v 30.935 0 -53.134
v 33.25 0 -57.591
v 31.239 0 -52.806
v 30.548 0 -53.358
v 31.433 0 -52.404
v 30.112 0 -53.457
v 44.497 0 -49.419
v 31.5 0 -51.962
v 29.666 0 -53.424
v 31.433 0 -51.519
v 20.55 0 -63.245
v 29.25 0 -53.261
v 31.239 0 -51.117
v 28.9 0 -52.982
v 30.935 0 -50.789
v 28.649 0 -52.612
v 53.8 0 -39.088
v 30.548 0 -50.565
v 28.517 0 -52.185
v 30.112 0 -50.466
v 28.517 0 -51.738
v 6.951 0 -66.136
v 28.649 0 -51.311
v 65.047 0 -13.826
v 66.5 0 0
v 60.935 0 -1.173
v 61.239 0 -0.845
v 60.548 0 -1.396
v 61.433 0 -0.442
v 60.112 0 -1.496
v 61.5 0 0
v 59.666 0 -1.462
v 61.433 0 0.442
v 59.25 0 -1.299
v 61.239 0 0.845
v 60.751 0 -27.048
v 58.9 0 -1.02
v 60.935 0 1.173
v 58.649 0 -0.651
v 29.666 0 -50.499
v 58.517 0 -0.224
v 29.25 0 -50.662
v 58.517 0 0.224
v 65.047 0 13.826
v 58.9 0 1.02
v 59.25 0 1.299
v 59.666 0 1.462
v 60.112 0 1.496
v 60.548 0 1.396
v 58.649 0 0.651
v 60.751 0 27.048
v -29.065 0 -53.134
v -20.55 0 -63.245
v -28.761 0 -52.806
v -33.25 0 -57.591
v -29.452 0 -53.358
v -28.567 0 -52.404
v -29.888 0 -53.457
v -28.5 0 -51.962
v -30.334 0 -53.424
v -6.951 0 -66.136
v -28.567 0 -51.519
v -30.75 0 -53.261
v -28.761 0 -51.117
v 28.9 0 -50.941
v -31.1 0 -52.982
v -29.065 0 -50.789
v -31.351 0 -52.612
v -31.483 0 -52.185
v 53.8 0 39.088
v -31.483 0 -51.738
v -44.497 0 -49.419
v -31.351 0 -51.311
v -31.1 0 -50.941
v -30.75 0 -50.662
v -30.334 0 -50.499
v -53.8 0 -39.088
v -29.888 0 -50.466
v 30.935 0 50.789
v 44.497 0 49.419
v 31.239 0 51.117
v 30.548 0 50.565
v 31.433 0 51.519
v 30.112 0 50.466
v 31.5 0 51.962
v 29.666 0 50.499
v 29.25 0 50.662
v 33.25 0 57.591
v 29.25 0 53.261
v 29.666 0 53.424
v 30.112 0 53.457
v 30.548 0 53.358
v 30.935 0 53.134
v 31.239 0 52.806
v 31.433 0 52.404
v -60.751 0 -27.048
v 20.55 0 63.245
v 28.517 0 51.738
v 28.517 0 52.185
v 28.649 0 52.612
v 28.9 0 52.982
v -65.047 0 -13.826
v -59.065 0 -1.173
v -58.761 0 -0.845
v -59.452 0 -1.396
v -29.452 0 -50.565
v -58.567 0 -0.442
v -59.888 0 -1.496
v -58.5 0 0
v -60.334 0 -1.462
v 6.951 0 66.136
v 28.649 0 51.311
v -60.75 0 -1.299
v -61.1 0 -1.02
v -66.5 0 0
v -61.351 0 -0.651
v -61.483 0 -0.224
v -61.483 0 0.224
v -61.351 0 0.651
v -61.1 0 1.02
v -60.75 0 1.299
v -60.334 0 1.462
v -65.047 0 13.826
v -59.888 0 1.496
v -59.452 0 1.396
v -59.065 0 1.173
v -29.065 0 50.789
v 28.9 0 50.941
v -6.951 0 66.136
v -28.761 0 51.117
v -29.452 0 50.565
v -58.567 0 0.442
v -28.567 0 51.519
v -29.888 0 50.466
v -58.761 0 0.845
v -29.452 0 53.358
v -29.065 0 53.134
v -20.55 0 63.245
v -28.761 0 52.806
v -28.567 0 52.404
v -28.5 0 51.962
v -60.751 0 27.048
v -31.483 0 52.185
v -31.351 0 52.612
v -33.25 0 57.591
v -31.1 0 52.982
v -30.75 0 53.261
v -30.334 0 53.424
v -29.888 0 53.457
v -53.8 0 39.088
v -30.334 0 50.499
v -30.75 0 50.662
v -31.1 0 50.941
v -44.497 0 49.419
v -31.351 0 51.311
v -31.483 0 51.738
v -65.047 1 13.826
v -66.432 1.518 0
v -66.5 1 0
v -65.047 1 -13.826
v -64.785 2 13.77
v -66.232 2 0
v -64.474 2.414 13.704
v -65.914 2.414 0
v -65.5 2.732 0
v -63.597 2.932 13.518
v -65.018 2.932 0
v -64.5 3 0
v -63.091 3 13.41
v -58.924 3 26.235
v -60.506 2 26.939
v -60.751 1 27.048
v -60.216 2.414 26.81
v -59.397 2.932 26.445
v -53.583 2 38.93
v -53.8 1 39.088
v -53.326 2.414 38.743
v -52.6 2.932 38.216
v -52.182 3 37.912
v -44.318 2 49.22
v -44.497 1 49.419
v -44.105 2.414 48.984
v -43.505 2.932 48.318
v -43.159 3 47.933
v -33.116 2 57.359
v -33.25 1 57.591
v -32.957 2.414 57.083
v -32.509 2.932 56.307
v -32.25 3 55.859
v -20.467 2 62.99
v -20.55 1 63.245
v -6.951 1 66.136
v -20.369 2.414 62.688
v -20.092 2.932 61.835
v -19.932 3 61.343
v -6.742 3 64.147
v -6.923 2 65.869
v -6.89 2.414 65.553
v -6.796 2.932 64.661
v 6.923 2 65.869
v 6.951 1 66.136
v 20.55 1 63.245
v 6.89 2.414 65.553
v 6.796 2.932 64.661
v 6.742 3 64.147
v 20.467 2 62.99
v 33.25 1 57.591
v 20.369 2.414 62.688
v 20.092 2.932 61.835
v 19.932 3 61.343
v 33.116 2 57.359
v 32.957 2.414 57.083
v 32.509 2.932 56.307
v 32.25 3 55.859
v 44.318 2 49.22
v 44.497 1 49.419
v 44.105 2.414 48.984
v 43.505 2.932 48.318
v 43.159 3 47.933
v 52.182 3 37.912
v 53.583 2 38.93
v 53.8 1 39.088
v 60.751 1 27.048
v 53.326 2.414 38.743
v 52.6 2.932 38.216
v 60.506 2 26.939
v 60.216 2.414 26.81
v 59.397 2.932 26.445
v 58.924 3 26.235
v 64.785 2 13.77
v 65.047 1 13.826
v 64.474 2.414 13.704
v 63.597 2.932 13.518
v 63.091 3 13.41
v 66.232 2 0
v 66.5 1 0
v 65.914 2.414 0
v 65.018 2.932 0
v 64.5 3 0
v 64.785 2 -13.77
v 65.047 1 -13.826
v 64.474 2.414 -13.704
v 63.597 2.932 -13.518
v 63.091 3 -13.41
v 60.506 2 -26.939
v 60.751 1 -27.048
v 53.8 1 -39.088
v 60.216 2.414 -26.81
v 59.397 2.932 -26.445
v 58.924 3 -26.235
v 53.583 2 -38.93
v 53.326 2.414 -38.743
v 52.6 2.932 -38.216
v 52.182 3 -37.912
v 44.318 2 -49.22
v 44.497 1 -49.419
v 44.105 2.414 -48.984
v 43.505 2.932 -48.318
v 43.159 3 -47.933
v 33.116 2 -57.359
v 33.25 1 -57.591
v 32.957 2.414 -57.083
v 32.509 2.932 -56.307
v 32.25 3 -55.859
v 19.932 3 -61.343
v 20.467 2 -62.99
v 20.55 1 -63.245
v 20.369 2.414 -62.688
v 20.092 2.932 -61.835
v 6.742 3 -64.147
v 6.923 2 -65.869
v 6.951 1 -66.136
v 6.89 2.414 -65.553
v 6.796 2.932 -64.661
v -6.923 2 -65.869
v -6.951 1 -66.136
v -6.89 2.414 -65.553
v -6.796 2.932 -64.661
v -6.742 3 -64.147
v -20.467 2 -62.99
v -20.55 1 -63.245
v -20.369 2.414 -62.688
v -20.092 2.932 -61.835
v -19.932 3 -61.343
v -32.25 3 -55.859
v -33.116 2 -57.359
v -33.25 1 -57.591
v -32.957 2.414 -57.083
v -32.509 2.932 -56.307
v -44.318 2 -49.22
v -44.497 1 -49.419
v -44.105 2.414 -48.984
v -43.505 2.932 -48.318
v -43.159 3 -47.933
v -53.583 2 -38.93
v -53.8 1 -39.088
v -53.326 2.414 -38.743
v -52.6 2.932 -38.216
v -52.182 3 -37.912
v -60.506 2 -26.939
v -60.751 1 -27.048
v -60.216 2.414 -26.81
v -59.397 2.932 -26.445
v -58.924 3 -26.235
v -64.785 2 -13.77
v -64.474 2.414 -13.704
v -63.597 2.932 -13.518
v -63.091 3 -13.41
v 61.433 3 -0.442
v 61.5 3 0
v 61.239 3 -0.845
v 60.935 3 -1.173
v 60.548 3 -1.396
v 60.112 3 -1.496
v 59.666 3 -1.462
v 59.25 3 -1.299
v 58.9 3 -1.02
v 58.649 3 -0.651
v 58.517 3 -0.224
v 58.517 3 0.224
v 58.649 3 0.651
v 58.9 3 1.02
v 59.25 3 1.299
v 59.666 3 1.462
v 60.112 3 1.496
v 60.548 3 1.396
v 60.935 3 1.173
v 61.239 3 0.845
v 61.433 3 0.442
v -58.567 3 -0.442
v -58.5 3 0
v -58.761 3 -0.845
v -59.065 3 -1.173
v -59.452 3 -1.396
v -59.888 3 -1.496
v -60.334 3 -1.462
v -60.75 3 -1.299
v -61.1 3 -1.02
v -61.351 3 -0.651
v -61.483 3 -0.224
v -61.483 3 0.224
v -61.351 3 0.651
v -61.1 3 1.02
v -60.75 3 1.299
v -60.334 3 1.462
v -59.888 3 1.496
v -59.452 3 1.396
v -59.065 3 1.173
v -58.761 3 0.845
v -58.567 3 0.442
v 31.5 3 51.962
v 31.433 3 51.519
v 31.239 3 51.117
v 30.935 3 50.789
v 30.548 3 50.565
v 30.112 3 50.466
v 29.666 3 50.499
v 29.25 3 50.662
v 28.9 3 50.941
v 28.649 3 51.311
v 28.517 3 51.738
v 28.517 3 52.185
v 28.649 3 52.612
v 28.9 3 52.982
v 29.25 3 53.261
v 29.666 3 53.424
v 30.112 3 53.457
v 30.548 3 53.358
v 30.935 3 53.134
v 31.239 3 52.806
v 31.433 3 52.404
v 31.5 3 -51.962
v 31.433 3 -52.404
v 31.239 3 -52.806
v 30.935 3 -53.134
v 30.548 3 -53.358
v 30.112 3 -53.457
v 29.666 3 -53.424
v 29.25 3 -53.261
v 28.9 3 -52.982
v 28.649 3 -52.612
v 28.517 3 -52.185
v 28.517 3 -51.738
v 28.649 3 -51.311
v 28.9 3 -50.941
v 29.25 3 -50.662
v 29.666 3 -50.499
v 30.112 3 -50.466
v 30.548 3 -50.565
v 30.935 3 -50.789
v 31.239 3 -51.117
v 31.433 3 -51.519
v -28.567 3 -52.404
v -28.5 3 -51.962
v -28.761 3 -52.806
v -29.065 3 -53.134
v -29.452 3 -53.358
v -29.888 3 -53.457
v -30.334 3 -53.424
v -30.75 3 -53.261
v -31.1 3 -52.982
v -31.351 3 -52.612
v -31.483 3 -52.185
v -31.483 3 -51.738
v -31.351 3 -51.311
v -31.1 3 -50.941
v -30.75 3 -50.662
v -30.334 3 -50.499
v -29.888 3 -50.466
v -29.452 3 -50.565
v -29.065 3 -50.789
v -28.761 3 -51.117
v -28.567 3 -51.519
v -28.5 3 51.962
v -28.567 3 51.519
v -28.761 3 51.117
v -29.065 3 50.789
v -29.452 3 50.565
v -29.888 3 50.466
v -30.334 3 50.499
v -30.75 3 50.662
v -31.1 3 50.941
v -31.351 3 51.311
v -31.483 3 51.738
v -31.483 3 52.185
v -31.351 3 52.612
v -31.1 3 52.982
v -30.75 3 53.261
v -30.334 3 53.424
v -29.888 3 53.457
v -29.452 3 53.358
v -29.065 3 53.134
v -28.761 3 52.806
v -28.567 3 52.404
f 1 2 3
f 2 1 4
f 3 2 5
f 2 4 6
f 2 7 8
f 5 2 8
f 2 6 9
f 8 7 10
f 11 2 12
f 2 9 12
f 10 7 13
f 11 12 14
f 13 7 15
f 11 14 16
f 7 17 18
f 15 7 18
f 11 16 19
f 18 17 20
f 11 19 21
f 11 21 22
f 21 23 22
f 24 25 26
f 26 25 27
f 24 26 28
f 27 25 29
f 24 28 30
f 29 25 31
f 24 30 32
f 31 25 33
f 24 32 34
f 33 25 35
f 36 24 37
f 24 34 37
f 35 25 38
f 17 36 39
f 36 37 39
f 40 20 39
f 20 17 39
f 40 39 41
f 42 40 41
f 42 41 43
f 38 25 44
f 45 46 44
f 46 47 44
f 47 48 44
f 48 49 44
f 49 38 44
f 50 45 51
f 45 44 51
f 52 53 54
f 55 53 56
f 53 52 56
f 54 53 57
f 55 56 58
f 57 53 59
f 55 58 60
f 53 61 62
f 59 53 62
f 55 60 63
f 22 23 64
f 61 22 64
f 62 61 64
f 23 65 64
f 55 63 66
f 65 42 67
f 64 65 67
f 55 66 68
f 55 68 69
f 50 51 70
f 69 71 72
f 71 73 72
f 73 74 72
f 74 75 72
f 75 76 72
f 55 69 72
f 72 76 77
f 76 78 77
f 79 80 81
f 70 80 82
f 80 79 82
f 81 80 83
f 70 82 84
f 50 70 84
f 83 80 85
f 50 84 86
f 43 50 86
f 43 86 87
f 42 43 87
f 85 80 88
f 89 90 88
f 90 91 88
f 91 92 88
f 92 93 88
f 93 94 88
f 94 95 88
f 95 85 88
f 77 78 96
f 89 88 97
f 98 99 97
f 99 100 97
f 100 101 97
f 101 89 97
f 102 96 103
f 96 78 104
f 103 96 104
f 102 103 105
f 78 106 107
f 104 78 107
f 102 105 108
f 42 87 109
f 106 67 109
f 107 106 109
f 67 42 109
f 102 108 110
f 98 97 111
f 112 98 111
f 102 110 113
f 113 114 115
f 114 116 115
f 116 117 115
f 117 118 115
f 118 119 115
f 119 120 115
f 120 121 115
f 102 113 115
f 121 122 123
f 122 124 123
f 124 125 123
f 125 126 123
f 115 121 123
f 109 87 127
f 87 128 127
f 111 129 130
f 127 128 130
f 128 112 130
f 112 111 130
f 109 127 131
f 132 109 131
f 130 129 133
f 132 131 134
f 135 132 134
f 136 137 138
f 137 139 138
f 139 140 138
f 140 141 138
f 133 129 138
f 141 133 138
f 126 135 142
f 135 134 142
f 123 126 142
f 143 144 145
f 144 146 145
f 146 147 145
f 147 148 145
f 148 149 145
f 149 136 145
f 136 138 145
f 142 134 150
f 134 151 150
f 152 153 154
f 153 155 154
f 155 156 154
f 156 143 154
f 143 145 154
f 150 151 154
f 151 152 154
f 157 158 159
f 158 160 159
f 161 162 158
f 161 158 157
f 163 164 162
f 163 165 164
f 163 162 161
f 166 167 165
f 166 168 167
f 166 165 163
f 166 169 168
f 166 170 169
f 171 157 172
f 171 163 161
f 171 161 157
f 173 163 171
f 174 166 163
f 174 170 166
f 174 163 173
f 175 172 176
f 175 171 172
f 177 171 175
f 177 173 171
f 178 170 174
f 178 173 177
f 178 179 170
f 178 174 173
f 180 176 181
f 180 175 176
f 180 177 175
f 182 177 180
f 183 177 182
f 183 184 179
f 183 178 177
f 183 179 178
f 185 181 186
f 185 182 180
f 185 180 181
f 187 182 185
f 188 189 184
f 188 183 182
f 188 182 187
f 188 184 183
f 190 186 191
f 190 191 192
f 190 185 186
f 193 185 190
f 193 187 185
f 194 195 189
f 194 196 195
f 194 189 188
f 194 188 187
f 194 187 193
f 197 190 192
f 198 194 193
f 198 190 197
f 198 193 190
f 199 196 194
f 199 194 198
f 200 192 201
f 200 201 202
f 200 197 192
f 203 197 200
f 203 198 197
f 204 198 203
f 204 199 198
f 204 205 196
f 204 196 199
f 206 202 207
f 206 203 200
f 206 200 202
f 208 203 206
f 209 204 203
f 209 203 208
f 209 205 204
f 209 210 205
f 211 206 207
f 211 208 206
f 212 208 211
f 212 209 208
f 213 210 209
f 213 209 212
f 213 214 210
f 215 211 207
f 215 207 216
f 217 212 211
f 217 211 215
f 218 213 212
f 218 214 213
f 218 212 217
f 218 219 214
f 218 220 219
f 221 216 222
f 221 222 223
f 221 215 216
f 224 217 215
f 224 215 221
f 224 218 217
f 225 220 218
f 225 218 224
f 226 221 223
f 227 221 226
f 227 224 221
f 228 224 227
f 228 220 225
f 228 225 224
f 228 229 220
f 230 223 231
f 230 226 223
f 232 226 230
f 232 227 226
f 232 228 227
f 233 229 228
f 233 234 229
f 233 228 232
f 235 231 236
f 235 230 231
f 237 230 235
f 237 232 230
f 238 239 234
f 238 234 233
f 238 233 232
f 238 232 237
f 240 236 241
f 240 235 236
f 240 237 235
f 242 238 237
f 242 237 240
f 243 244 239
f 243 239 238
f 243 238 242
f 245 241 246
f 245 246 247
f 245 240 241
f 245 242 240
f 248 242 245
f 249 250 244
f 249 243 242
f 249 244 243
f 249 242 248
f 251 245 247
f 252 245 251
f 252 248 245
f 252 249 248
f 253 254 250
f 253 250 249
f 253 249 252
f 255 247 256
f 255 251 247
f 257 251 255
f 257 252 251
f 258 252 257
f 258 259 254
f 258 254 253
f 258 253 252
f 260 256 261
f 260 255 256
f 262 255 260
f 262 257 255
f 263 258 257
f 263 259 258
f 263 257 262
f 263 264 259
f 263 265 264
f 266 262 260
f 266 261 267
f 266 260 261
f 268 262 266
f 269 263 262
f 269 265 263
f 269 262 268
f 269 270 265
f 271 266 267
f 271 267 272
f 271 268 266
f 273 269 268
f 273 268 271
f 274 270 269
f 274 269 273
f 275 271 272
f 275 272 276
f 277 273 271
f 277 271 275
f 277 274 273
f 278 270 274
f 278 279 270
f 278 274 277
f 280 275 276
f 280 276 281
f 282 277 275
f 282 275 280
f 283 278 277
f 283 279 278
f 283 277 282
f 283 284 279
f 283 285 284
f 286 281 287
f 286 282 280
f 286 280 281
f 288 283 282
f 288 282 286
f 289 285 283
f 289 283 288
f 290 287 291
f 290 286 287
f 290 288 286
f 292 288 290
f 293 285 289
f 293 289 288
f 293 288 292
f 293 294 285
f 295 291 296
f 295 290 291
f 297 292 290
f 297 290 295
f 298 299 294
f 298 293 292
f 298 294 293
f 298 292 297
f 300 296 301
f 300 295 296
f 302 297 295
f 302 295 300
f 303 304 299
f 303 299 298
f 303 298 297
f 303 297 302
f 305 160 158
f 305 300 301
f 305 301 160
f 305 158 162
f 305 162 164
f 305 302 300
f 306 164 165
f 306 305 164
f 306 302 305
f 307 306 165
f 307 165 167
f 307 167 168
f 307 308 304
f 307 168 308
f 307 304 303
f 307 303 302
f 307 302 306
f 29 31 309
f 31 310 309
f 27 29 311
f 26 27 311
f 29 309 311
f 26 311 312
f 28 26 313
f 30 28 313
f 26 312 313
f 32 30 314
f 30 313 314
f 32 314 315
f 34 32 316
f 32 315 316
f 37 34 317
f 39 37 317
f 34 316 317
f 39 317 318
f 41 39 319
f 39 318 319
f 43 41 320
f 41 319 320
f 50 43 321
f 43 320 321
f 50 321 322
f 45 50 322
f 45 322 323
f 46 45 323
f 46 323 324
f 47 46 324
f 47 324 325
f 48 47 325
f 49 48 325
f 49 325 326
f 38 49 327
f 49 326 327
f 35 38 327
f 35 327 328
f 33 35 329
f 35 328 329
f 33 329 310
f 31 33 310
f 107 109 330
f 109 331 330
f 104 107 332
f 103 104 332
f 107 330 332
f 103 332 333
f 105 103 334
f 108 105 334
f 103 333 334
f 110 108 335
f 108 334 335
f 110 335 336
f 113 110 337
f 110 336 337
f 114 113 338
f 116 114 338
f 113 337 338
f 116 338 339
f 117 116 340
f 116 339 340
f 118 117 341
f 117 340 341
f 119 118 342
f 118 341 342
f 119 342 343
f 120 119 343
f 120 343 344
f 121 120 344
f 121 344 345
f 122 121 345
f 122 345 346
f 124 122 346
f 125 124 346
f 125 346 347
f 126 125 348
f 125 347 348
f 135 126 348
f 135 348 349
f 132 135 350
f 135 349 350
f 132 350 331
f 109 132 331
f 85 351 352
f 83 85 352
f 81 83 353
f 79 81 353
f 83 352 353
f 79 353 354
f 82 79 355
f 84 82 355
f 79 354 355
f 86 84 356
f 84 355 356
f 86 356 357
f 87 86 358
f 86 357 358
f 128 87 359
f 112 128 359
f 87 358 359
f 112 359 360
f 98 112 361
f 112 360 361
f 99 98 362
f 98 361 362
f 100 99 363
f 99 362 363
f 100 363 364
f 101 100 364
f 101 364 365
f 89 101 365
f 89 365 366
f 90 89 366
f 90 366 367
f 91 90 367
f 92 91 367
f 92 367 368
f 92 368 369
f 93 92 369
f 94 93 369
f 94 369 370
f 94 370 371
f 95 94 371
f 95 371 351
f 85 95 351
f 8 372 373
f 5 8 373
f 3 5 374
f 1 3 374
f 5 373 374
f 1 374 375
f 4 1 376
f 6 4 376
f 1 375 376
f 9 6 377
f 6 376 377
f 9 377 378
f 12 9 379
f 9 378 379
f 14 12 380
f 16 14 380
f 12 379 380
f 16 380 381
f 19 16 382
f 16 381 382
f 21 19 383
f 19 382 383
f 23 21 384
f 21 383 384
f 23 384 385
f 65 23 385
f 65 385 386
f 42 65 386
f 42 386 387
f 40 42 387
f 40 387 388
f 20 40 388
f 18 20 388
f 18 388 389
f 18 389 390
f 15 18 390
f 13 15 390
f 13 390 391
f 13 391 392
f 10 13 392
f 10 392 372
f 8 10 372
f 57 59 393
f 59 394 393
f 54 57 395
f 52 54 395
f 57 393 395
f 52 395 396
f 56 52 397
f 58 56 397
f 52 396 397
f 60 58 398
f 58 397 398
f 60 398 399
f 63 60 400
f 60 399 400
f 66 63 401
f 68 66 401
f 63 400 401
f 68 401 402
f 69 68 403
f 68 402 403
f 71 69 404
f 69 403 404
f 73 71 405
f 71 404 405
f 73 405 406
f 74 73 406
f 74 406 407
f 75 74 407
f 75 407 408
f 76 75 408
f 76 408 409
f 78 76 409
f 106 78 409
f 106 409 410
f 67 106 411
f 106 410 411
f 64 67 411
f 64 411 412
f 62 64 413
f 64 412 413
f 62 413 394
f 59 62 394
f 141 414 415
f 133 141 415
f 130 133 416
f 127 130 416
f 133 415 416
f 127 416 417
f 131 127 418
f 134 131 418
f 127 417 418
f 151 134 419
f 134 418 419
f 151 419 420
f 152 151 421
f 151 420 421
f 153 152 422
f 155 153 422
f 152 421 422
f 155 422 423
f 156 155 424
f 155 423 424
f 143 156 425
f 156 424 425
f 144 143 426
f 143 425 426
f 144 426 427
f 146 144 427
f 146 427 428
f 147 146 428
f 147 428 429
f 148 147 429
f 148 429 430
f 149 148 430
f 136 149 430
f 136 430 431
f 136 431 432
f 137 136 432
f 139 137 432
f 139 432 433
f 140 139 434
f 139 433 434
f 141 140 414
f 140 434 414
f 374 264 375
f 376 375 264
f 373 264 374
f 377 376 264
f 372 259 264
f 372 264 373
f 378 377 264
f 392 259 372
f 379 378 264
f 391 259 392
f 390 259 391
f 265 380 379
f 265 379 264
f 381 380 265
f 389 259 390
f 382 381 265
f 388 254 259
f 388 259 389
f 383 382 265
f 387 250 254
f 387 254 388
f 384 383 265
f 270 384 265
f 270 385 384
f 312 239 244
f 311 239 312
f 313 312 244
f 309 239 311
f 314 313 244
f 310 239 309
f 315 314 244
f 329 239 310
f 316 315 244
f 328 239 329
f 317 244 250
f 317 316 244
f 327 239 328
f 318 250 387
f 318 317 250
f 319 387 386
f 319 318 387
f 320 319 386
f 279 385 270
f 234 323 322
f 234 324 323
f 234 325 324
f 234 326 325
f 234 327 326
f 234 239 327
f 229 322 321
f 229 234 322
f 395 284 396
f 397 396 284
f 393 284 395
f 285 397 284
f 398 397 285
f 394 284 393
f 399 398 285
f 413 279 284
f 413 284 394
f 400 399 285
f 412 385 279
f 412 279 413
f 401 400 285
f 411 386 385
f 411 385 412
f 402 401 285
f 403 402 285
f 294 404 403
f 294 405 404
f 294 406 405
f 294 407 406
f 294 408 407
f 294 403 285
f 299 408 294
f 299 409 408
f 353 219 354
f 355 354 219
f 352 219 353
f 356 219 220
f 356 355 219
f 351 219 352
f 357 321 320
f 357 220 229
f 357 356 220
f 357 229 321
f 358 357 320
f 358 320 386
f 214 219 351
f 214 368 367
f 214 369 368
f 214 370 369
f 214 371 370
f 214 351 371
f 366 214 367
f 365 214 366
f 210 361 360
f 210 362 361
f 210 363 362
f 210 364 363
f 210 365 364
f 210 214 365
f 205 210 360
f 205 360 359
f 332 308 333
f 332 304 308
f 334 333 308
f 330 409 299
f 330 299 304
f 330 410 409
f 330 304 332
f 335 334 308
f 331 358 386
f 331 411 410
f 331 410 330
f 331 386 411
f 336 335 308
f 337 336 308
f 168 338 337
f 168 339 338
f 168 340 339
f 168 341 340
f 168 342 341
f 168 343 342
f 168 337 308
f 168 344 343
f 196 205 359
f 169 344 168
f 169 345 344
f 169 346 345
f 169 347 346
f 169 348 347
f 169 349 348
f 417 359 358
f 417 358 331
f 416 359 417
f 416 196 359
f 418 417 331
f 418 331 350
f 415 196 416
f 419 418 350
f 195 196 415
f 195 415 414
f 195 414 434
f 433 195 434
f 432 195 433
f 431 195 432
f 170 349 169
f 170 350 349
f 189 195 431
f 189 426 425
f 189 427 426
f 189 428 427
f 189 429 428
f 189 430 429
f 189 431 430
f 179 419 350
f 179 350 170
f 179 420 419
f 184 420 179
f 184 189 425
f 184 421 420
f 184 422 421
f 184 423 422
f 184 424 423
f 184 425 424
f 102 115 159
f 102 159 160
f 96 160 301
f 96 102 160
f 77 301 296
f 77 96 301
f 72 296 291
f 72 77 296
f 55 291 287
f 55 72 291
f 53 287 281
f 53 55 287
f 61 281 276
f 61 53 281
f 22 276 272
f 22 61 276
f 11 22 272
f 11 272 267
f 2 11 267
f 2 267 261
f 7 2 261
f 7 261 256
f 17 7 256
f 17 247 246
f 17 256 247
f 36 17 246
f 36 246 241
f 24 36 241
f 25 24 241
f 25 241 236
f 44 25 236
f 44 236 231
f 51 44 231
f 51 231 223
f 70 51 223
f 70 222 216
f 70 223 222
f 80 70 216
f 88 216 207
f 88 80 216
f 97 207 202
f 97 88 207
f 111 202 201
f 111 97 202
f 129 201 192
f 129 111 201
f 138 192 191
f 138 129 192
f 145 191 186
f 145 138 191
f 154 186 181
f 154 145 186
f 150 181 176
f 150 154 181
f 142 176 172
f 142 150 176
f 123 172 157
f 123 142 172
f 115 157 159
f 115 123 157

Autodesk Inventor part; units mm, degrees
ref_plane "YZ Plane" through (0, 0, 0) normal (1, 0, 0) x (0, 1, 0)
ref_plane "XZ Plane" through (0, 0, 0) normal (0, 1, 0) x (-1, 0, 0)
ref_plane "XY Plane" through (0, 0, 0) normal (0, 0, 1) x (1, 0, 0)
sketch "Sketch1" plane through (0, 0, 0) normal (0, 1, 0) x (-1, 0, 0)
  circle A0 centre (0, 0) radius 66.5
  dimension "d0" = 133
extrude "Extrusion1" add sketch "Sketch1" along normal blind 3
sketch "Sketch2" plane through (0, 3, 0) normal (0, 1, 0) x (1, 0, 0)
  circle A0 centre (0, 0) radius 55
  circle A1 centre (-60, 0) radius 1.5
  circle A2 centre (-30, -51.9615) radius 1.5
  circle A3 centre (30, -51.9615) radius 1.5
  circle A4 centre (60, 0) radius 1.5
  circle A5 centre (30, 51.9615) radius 1.5
  circle A6 centre (-30, 51.9615) radius 1.5
  dimension "d3" = 110
  dimension "d4" = 3
  dimension "d5" = 60
  dimension "d8" = 360
extrude "Extrusion2" cut sketch "Sketch2" against normal blind 3 contours A1 | A2 | A3 | A4 | A5 | A6
fillet "Fillet1" radius 2 1 edges at (66.5, 3, 0)
properties part number "Top"
